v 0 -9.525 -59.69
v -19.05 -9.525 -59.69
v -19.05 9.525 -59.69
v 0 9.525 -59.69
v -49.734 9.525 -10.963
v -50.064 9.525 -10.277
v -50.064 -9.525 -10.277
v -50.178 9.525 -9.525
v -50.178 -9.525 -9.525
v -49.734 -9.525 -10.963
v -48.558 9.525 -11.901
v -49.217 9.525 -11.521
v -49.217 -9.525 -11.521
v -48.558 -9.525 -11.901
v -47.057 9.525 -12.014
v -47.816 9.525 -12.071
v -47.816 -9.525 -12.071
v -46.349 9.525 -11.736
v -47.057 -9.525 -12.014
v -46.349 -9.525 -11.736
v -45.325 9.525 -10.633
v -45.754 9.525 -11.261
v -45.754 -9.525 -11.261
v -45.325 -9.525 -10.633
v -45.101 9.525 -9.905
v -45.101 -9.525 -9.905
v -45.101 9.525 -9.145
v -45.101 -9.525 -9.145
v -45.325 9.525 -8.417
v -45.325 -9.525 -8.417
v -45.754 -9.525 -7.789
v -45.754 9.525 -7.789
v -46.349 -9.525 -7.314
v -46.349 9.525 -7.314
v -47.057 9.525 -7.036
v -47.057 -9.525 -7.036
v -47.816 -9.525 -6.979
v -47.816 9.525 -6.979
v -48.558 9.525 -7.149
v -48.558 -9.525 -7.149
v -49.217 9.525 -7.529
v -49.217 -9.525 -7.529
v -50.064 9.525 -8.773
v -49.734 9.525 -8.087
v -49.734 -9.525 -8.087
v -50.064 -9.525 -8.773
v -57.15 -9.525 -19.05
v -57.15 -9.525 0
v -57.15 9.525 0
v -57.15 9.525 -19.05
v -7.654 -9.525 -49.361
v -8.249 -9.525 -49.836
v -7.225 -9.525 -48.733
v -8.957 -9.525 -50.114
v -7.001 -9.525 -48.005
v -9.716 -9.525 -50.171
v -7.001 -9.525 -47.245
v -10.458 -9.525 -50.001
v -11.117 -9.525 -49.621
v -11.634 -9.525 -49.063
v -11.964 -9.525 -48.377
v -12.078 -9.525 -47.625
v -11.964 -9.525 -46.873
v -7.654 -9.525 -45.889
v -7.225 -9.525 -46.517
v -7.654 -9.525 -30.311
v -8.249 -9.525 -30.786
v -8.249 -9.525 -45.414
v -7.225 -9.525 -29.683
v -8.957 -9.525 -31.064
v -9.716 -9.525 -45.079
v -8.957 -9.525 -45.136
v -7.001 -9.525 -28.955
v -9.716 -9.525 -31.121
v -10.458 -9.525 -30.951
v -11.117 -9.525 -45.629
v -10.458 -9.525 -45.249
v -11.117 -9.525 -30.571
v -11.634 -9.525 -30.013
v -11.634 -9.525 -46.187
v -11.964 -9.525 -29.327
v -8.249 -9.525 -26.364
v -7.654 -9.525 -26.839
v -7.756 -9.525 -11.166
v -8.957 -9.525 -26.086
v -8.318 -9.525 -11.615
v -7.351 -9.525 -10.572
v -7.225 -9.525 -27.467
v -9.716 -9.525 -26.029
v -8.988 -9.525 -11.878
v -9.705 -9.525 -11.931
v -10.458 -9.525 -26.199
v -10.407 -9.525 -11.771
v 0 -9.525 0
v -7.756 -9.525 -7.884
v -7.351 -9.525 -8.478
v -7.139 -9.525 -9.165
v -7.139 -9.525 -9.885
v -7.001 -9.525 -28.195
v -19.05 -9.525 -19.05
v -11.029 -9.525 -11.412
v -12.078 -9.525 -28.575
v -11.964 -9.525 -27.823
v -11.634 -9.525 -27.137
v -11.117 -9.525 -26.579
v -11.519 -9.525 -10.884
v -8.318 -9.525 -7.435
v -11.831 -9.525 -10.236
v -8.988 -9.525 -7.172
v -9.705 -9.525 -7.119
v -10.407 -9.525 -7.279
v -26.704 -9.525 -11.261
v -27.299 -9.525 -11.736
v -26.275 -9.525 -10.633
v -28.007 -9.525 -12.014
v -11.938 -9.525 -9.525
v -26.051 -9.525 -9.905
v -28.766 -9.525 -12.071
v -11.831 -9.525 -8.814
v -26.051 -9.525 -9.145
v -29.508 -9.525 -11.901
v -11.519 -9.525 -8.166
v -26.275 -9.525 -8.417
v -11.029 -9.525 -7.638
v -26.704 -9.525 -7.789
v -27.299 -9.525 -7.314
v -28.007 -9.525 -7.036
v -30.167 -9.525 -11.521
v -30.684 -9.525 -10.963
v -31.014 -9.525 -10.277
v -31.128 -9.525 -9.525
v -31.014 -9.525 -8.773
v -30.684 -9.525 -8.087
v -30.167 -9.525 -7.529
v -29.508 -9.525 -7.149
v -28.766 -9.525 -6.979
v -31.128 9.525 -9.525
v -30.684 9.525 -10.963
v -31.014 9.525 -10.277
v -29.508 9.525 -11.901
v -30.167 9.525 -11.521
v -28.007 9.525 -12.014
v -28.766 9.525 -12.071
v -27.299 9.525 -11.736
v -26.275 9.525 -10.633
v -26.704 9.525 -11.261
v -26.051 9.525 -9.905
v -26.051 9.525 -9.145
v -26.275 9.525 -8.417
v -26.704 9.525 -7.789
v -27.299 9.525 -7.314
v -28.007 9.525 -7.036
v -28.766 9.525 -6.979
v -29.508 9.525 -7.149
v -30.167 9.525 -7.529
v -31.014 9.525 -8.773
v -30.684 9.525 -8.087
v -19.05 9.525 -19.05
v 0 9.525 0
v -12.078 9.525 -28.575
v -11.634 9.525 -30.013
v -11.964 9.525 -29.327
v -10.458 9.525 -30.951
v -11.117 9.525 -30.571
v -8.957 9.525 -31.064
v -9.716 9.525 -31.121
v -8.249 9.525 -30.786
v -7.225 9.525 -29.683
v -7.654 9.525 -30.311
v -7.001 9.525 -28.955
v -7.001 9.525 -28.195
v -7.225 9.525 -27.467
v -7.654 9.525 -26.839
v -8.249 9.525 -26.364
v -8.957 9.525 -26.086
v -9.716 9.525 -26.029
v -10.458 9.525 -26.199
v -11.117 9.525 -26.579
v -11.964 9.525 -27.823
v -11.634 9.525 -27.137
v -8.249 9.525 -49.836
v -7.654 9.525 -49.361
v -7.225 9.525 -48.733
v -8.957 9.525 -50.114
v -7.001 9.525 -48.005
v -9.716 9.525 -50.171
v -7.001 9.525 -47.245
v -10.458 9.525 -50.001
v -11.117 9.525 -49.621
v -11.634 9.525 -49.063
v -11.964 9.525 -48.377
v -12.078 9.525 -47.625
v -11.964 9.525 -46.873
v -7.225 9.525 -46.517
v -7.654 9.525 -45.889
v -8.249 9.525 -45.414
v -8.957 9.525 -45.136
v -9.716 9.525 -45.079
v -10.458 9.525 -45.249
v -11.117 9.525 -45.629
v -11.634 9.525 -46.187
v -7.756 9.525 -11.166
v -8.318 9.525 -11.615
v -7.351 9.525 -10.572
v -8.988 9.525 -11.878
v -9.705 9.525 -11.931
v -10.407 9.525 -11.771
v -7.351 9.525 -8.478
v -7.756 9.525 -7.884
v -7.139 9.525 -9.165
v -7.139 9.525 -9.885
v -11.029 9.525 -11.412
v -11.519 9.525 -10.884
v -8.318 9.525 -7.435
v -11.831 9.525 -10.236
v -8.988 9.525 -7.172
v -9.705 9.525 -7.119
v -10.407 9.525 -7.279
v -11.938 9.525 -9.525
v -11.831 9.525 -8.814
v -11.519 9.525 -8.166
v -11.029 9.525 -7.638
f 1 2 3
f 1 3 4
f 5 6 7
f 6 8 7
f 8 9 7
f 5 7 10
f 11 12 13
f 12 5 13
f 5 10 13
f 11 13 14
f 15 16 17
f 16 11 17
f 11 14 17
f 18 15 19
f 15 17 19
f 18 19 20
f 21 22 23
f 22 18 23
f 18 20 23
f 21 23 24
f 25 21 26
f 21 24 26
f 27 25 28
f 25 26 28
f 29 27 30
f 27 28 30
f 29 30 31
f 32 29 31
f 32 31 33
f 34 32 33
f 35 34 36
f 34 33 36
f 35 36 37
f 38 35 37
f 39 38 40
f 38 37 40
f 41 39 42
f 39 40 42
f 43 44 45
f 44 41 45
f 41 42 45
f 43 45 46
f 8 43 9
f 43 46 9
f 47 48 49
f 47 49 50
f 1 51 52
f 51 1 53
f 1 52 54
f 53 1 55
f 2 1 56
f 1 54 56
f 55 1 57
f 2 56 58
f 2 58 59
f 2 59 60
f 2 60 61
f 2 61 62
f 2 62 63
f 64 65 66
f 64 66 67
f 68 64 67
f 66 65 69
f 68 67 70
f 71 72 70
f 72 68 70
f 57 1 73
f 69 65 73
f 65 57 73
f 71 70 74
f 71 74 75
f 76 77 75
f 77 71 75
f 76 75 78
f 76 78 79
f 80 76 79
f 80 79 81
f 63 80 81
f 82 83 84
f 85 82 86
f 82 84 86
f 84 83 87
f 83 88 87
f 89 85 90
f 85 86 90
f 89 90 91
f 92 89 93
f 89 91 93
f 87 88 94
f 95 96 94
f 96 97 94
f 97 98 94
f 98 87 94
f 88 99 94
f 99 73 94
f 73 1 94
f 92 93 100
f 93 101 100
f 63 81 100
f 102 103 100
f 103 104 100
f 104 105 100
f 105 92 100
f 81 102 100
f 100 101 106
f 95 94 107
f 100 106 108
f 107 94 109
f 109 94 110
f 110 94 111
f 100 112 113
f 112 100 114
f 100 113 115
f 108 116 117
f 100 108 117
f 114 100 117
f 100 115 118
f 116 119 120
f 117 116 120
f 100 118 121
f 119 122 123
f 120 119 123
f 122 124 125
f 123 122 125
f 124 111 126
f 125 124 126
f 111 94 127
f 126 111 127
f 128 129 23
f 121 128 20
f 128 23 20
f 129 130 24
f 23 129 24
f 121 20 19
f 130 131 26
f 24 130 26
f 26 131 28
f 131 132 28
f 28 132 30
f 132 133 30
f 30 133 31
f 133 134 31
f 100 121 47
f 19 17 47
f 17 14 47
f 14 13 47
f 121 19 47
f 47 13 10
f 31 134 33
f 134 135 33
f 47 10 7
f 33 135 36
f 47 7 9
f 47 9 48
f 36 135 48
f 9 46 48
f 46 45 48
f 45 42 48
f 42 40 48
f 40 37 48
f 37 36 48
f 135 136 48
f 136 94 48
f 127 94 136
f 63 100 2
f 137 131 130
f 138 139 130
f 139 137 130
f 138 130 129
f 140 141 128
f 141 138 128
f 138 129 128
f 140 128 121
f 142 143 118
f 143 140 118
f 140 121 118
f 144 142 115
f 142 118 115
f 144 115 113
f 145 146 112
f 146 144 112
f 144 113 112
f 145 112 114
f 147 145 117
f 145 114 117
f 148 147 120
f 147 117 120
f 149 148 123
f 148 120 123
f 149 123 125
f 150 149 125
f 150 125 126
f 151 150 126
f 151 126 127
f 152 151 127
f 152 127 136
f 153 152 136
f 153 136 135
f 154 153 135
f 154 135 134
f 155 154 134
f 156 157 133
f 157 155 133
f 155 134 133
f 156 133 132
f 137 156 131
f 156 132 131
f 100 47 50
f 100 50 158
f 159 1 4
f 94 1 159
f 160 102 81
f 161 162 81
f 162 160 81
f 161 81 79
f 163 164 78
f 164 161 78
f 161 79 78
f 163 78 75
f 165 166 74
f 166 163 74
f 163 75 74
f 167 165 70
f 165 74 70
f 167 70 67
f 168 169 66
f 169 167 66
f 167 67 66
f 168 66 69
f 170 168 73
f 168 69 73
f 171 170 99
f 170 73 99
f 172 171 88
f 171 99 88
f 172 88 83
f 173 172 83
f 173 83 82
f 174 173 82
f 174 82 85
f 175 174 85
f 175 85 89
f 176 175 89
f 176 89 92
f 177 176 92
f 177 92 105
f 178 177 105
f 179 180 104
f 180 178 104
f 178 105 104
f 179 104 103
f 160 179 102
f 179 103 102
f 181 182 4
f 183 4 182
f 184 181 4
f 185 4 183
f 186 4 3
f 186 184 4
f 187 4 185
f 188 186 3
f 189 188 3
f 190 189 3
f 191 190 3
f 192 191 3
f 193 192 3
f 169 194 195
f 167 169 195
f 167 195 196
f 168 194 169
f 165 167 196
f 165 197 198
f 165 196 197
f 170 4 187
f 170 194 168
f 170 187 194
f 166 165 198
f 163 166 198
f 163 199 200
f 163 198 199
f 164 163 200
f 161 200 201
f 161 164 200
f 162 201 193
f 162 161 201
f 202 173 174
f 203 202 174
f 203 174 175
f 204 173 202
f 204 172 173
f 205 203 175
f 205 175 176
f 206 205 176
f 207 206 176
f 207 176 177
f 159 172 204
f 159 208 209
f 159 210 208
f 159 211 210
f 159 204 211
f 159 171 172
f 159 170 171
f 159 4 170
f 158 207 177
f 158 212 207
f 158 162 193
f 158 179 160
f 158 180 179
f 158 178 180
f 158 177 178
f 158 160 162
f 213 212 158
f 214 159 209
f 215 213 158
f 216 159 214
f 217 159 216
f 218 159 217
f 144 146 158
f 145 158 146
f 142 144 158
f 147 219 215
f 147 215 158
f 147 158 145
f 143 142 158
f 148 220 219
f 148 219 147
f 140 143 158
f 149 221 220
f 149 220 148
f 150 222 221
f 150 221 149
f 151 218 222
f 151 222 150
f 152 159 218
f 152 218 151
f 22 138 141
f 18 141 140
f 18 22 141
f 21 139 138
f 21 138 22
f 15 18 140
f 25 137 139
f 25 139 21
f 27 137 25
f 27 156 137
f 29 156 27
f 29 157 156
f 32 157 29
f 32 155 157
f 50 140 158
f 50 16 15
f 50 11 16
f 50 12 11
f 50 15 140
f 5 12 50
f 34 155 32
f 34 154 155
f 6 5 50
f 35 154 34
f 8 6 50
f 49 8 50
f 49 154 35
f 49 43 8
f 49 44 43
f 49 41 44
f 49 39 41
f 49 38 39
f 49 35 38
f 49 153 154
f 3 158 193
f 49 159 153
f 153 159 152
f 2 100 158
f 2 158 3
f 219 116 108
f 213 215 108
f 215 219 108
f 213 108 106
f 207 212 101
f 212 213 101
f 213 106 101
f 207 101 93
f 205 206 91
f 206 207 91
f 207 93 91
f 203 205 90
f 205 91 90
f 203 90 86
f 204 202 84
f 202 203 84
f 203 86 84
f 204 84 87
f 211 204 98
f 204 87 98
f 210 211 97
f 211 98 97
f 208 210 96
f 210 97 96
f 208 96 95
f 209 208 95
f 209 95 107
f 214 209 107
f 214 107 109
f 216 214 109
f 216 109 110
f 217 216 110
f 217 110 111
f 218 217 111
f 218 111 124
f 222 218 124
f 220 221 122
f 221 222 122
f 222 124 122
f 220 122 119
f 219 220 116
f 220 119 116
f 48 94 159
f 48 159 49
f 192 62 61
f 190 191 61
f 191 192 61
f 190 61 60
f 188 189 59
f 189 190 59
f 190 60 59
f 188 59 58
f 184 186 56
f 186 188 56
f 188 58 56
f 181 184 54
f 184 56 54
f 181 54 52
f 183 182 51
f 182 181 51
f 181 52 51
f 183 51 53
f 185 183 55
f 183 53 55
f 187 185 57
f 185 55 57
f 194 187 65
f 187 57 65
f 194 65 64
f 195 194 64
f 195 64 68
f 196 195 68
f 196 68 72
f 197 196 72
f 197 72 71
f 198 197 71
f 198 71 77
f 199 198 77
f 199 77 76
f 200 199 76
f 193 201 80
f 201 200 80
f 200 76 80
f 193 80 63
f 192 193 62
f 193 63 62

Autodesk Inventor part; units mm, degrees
ref_plane "YZ Plane" through (0, 0, 0) normal (1, 0, 0) x (0, 1, 0)
ref_plane "XZ Plane" through (0, 0, 0) normal (0, 1, 0) x (-1, 0, 0)
ref_plane "XY Plane" through (0, 0, 0) normal (0, 0, 1) x (1, 0, 0)
sketch "Sketch1" plane through (0, 0, 0) normal (0, 1, 0) x (-1, 0, 0)
  line L0 (0, 0) -> (57.15, 0)
  line L1 (57.15, 0) -> (57.15, -19.05)
  line L2 (57.15, -19.05) -> (19.05, -19.05)
  line L3 (19.05, -19.05) -> (19.05, -59.69)
  line L4 (19.05, -59.69) -> (0, -59.69)
  line L5 (0, -59.69) -> (0, 0)
  circle A0 centre (28.575, -9.525) radius 2.5527
  circle A1 centre (47.625, -9.525) radius 2.5527
  line L6 (19.05, -19.05) -> (0, 0) construction
  circle A2 centre (9.525, -28.575) radius 2.5527
  circle A3 centre (9.525, -47.625) radius 2.5527
  circle A4 centre (9.525, -9.525) radius 2.413
  point P0 (57.15, -9.525)
  dimension "d0" = 19.05
  dimension "d1" = 19.05
  dimension "d2" = 59.69
  dimension "d3" = 57.15
  dimension "d4" = 5.1054
  dimension "d5" = 28.575
  dimension "d6" = 19.05
  dimension "d19" = 4.826
extrude "Extrusion1" add sketch "Sketch1" along normal mid plane 19.05
thread "Thread1" size "1/4-20 UNC" class "2B" standard "ANSI Unified Screw Threads" full length
thread "Thread2" size "1/4-20 UNC" class "2B" standard "ANSI Unified Screw Threads" full length
thread "Thread3" size "1/4-20 UNC" class "2B" standard "ANSI Unified Screw Threads" full length
thread "Thread4" size "1/4-20 UNC" class "2B" standard "ANSI Unified Screw Threads" full length
thread "Thread5" size "10-32 UNF" class "2B" standard "ANSI Unified Screw Threads" full length
properties part number "STRU_004_DoubleBillet_90_2.25in" material "Aluminum 6061"
